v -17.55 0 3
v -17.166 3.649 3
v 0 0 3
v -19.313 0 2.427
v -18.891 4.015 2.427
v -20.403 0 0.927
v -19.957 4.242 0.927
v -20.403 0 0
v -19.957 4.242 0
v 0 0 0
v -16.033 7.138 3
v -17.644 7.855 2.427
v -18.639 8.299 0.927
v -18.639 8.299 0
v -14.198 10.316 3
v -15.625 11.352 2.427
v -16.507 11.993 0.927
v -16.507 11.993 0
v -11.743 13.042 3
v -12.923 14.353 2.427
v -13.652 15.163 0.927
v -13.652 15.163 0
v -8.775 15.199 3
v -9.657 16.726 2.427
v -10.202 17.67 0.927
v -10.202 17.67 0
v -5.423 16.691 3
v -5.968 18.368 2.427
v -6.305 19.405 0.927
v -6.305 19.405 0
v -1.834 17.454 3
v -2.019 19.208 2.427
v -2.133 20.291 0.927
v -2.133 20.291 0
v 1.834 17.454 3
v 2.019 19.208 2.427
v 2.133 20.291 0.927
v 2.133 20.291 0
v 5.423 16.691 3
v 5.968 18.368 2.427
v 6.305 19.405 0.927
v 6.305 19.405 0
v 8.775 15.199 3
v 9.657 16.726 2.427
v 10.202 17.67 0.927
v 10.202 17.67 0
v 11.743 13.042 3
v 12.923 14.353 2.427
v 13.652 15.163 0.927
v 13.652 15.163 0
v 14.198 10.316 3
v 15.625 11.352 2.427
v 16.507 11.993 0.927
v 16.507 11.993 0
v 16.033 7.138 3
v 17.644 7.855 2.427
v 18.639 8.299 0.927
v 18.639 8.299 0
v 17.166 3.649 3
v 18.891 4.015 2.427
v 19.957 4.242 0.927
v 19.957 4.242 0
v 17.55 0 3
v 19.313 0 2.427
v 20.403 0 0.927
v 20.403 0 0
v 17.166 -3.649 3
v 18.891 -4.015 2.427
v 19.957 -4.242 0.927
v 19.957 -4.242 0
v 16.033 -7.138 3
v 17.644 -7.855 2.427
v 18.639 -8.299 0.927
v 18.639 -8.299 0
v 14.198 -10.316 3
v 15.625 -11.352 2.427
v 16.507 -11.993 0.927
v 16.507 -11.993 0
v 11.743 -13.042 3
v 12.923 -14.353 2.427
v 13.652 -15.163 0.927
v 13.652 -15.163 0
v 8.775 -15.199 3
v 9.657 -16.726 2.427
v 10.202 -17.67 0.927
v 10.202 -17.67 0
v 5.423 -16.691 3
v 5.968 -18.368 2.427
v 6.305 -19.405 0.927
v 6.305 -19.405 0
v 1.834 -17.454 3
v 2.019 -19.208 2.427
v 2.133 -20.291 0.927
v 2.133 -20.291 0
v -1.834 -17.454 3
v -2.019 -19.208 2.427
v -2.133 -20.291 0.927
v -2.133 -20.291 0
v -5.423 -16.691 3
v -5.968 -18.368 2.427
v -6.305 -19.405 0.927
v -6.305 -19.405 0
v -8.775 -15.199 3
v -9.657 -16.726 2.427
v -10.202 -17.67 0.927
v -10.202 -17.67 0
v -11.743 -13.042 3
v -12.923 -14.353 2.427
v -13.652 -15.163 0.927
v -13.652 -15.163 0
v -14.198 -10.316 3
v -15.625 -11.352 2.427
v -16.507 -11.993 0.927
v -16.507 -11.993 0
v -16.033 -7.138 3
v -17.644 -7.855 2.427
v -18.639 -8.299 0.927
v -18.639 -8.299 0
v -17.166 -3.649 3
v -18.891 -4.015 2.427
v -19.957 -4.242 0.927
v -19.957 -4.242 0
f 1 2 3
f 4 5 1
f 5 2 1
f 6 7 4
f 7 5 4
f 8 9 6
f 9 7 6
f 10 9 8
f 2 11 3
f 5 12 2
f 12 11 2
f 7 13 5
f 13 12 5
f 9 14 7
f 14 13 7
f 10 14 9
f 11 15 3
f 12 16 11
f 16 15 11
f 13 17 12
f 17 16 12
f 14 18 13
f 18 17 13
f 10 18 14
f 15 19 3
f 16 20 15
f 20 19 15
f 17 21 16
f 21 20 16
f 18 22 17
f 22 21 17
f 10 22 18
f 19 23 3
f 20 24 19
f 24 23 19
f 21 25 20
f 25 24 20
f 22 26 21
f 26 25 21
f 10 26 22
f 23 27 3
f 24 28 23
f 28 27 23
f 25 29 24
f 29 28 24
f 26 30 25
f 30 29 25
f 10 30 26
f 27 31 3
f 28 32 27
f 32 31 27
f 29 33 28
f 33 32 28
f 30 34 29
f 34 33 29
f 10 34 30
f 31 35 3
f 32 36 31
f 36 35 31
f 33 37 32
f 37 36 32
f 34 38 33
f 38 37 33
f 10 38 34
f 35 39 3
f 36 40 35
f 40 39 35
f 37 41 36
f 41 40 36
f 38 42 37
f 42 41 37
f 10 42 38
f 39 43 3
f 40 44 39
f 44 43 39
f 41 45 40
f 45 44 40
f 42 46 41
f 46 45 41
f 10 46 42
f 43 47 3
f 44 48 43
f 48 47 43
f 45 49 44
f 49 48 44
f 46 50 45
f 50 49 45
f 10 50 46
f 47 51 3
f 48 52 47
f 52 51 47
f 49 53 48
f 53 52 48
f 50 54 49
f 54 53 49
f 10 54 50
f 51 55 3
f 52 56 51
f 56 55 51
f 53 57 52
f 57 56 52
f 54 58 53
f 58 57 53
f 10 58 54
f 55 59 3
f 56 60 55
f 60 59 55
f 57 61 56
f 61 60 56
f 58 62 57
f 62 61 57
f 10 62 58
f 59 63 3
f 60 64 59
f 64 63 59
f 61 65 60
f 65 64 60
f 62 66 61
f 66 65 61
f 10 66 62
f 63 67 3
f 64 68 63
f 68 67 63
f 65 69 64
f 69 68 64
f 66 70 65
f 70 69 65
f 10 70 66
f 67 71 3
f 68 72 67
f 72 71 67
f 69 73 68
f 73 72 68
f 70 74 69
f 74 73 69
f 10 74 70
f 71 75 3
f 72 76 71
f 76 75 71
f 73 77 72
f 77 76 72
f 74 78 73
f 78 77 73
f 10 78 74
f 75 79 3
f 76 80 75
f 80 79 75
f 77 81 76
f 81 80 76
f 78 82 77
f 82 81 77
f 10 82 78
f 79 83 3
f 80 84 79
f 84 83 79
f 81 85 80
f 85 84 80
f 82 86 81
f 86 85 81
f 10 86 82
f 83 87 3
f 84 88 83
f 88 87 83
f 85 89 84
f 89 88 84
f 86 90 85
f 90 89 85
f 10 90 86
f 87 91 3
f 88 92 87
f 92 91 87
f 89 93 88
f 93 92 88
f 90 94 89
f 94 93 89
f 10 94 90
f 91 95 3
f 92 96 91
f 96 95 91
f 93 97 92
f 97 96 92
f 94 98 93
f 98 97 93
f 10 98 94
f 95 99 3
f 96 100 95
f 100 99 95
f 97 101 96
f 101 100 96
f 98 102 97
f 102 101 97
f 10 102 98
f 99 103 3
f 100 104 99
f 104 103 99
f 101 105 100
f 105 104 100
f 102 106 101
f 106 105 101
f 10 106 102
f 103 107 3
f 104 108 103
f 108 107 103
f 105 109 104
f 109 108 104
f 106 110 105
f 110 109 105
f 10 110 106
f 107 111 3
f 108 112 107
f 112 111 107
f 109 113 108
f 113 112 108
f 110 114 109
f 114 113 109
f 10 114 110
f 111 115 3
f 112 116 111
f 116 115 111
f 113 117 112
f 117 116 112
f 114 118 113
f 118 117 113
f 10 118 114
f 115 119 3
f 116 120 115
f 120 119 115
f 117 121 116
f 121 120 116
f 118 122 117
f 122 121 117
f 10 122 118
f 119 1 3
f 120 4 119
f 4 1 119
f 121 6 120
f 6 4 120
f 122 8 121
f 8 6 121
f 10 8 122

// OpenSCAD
rotate_extrude()
	rotate([0,180,-90])
		hull()
		{
		square ([3,(38.1-3)/2]);
		translate([0,(38.1-3)/2,0])
			difference()
			{
				circle(r=3, center=false);
				translate([-3,-3])		
					square([3,6]);
			}
		}
